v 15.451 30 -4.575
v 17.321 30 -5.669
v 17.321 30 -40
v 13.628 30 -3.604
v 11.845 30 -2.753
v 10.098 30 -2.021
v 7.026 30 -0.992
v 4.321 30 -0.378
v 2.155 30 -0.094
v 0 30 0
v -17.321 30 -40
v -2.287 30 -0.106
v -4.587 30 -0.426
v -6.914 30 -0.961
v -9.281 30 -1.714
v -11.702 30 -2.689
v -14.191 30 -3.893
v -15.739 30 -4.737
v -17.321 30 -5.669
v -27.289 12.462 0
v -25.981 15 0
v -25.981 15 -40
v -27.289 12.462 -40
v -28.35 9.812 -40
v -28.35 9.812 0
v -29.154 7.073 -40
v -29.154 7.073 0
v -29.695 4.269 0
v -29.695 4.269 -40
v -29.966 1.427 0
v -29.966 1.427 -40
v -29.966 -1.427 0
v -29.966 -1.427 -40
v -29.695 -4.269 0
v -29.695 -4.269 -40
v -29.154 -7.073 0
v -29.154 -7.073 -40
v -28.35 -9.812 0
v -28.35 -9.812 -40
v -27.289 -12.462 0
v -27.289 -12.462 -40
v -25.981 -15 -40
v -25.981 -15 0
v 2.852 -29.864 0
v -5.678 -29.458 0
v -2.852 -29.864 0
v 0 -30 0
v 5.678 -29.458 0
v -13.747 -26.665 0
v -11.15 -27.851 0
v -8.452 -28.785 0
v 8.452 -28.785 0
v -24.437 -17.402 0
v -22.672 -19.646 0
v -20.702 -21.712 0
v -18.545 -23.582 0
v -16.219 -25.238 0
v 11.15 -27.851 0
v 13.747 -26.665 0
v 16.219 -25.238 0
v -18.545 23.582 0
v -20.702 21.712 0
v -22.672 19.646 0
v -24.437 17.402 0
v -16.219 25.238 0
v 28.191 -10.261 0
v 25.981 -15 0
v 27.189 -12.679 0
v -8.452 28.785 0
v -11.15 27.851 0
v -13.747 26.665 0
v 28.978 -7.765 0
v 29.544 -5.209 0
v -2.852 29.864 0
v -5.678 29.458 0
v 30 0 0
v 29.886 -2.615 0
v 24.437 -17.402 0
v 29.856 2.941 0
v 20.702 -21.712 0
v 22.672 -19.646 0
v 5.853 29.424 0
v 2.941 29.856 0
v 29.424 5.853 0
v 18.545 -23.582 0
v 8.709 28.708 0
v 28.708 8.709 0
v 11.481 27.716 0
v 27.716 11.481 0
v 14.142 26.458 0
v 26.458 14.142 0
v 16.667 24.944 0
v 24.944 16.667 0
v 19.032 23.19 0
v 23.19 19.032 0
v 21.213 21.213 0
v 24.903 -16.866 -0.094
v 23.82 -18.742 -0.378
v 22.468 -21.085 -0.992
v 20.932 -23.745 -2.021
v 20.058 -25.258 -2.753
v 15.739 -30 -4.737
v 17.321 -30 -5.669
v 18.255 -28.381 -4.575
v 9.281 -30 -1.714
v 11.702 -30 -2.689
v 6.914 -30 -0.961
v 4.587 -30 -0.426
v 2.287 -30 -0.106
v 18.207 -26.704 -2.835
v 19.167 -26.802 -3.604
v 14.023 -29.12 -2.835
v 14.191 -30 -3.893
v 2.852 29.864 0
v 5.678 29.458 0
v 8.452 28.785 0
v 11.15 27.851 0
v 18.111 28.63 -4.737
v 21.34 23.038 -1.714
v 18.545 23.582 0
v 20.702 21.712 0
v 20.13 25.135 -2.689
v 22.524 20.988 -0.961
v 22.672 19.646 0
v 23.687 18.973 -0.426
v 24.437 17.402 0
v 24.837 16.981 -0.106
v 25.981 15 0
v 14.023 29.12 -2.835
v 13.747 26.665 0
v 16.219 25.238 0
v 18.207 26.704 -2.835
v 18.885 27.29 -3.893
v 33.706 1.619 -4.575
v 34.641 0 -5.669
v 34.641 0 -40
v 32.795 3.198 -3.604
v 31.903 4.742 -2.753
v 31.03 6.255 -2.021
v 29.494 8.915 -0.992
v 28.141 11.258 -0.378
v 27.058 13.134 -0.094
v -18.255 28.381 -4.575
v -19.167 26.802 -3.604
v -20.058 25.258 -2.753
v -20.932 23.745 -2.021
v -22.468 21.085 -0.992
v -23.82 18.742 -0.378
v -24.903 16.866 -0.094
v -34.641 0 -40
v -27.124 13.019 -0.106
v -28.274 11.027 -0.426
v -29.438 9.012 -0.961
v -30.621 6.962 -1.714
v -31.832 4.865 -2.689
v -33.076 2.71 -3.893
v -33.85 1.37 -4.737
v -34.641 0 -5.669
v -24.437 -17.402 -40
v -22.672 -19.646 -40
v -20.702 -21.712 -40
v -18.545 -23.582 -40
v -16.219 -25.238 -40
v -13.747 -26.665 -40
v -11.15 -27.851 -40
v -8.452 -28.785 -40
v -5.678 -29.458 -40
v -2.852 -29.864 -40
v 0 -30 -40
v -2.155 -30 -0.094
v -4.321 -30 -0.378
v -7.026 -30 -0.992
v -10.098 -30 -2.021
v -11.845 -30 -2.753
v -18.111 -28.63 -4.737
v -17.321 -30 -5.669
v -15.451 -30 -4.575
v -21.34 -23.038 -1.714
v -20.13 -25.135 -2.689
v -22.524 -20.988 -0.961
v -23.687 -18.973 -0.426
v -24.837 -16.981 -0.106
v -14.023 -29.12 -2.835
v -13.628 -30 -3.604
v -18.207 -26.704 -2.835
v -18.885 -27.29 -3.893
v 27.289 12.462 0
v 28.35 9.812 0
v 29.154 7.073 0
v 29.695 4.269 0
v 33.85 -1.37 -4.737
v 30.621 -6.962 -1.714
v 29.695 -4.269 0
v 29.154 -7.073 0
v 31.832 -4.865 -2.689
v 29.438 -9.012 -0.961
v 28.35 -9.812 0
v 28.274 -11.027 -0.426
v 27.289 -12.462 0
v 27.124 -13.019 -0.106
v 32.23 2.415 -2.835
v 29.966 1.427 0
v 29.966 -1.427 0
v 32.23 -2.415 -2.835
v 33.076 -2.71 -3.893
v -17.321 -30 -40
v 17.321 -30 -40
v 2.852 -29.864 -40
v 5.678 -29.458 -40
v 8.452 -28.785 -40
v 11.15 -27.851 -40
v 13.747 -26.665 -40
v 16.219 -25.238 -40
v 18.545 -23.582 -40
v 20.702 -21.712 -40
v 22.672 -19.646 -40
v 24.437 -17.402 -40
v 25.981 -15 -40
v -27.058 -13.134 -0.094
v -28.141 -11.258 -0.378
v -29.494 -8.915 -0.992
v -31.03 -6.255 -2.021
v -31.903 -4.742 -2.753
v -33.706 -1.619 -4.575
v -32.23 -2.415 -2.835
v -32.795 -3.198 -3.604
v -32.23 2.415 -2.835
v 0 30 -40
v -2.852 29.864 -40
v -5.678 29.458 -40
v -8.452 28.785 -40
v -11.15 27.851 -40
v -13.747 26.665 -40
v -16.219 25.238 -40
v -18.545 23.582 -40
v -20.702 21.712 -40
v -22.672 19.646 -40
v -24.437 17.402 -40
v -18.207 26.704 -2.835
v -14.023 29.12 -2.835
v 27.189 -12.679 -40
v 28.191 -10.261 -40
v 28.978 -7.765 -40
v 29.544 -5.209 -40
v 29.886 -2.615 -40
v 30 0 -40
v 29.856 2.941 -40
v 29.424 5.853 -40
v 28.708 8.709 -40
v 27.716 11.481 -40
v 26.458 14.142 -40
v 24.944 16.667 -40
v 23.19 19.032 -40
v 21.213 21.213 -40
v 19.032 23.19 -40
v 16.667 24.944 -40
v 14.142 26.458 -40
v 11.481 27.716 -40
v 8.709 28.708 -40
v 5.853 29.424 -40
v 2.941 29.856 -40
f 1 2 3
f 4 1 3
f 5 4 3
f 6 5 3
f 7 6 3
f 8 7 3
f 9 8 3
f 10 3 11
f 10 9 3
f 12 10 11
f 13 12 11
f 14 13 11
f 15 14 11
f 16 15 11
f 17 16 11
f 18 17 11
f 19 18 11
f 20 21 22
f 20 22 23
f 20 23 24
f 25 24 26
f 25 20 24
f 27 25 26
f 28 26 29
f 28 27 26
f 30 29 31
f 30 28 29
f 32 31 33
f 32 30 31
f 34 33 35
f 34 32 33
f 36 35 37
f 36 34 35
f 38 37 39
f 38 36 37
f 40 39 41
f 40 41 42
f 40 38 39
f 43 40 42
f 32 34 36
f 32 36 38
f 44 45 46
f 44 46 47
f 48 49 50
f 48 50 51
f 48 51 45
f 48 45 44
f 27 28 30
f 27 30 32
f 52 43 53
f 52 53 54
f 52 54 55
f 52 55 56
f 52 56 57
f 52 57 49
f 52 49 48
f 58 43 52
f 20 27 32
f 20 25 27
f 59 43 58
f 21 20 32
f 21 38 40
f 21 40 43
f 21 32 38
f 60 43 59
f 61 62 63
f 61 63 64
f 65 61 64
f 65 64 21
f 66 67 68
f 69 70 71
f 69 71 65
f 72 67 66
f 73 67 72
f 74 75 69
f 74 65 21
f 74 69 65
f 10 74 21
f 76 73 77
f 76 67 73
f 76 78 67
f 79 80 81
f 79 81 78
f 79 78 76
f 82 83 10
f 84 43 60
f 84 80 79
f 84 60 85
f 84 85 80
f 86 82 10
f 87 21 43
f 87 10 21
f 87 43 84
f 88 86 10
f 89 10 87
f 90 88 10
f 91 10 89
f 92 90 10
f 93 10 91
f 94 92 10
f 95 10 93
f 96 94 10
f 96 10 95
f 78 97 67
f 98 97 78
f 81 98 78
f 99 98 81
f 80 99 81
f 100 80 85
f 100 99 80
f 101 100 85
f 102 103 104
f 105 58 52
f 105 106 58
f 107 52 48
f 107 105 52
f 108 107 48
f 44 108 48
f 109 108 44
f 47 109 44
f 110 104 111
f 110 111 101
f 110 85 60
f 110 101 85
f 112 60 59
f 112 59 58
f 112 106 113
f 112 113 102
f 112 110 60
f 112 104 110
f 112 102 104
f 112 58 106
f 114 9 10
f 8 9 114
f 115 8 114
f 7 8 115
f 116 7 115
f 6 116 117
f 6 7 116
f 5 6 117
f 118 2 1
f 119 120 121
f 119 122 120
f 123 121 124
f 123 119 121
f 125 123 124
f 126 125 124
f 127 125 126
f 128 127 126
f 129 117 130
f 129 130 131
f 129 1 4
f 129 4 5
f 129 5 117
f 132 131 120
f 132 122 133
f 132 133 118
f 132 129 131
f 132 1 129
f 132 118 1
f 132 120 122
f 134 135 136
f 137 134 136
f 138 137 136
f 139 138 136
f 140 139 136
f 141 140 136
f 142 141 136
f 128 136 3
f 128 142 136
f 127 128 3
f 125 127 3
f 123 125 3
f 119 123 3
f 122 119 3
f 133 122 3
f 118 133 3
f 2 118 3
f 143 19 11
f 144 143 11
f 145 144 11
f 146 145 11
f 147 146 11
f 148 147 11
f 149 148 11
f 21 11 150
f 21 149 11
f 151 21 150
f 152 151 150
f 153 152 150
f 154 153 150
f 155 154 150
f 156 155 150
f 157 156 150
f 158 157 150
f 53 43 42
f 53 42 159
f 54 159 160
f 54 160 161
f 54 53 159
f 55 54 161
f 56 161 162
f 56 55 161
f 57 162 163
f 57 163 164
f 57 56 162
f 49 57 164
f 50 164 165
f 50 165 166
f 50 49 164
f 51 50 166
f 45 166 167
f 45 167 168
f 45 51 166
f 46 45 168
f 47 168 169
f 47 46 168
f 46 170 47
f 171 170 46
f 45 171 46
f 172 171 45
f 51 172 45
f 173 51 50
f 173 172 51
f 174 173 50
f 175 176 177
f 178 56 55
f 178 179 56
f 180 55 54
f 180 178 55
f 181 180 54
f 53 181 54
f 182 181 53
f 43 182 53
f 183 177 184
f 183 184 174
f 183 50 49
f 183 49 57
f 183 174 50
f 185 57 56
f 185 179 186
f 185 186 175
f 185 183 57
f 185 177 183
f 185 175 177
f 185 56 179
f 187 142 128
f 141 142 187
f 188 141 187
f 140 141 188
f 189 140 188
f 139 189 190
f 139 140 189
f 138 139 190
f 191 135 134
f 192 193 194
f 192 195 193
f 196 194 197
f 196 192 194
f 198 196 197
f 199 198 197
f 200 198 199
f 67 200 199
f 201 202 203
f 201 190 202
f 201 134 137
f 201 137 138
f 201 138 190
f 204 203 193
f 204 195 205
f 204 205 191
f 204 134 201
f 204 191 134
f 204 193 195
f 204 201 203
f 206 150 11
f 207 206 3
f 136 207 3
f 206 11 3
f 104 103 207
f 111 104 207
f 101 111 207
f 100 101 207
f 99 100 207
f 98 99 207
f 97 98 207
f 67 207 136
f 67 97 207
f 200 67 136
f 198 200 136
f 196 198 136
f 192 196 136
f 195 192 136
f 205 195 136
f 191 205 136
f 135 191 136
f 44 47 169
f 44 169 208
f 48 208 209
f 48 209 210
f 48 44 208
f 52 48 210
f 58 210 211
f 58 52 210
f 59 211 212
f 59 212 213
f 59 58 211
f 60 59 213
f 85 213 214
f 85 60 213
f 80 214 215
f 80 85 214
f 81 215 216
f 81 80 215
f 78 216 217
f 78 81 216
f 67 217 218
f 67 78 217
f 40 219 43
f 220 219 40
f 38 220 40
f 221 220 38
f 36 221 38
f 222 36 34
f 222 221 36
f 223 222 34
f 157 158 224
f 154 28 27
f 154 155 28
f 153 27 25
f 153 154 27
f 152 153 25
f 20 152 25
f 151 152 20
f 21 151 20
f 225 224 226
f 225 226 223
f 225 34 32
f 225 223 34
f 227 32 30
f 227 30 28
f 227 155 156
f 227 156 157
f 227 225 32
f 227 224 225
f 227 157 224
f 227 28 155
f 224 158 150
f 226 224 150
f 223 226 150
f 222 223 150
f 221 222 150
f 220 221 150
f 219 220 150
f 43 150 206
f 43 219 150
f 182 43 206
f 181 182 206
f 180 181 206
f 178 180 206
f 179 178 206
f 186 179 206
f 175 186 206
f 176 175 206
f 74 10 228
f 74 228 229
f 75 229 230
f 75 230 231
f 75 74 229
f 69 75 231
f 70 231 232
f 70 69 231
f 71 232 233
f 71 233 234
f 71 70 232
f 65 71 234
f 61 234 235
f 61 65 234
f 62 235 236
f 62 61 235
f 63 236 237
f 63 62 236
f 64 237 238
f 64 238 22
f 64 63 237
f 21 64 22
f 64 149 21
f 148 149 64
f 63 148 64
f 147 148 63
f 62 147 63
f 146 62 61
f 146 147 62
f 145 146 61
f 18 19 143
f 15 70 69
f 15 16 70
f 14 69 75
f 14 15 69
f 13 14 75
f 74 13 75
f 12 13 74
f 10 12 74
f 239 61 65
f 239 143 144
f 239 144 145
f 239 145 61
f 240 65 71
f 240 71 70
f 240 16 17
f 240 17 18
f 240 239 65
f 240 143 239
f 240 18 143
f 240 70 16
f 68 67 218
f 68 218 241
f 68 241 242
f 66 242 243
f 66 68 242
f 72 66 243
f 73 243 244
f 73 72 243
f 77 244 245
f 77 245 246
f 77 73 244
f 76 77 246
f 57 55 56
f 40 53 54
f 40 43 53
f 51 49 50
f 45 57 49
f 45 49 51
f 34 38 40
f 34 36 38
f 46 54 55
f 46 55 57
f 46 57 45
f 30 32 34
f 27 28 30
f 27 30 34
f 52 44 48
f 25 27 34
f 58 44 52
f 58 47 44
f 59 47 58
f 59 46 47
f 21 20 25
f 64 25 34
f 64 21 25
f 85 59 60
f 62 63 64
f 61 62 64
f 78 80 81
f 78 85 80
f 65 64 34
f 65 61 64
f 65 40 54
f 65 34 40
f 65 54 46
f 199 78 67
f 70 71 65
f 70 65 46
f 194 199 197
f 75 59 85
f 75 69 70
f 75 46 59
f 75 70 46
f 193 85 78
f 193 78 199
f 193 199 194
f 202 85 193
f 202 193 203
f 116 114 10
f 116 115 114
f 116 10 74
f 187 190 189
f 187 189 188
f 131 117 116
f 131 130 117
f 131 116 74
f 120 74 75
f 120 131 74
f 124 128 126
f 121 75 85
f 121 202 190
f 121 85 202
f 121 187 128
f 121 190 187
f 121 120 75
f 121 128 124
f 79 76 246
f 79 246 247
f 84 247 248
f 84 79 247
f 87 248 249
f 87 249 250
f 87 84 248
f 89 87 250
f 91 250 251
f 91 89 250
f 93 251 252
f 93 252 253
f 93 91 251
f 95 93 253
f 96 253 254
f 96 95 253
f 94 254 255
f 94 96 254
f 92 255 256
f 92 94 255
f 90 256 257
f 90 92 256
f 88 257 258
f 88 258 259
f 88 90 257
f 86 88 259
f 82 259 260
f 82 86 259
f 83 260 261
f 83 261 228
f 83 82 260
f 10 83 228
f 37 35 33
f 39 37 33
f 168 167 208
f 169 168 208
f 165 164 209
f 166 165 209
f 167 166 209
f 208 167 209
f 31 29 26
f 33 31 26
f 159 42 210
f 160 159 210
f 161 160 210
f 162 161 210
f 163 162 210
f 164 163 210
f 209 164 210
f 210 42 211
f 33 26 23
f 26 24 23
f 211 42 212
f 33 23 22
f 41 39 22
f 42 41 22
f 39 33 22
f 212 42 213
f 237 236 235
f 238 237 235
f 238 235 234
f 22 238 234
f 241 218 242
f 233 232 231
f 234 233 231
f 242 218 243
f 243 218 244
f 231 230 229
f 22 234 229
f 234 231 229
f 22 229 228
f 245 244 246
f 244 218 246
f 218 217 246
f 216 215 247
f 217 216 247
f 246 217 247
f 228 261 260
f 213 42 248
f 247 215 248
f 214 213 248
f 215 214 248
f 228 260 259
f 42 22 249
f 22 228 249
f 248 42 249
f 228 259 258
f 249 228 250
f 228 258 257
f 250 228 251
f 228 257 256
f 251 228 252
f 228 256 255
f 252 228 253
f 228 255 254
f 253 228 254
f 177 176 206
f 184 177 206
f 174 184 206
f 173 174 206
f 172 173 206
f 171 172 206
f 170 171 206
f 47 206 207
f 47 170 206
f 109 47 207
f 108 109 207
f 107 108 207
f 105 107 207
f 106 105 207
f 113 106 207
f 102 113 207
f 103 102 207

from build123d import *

# Parameters (mm, degrees)
F2_DEPTH = 40


with BuildPart() as f2:
    # F1 (on face) → F2 (new body)
    with BuildSketch(Plane.XY):
        with BuildLine():
            ThreePointArc((25.9807619763, -15.0000002377), (28.9777747532, -7.7645714856), (30, 0))
            ThreePointArc((30, 0), (28.9777748337, 7.764571185), (25.9807622875, 14.9999996987))
            ThreePointArc((25.9807622875, 14.9999996987), (15.0000001082, 25.9807620511), (-9.81e-08, 30))
            ThreePointArc((-9.81e-08, 30), (-15.0000000857, 25.9807620641), (-25.9807621634, 14.9999999136))
            ThreePointArc((-25.9807621634, 14.9999999136), (-30, 2.886e-07), (-25.980762452, -14.9999994137))
            ThreePointArc((-25.980762452, -14.9999994137), (-15.0000002931, -25.9807619443), (0, -30))
            ThreePointArc((0, -30), (14.9999998812, -25.9807621821), (25.9807619763, -15.0000002377))
        make_face()
    extrude(amount=-F2_DEPTH)


with BuildPart() as f2b:
    # F0 (on Top) → F2, piece 2 (new body)
    with BuildSketch(Plane.XY):
        Polygon((17.3205080757, 30), (-17.3205080757, 30), (-34.6410161514, 0), (-17.3205080757, -30), (17.3205080757, -30), (34.6410161514, 0), align=None)
    extrude(amount=-F2_DEPTH)

    # F3 (on Front) → F4 (revolve, cut)
    with BuildSketch(Plane.XZ):
        Polygon((34.6410161514, 0), (30, 0), (34.6410161514, -5.6693819351), align=None)
    revolve(axis=Axis((0, 0, -15.6040294096), (0, 0, -1)), mode=Mode.SUBTRACT)


solid = Compound([f2.part, f2b.part])
